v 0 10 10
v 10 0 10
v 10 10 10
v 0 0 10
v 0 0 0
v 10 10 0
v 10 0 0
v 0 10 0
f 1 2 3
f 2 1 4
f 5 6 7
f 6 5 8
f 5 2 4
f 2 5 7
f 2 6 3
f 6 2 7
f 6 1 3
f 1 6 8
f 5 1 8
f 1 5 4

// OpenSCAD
//  CUBO SIMPLE

//  un cubo simple en el origen de cordenadas con una
//  arista igual a 10 unidades

// Pdta( este es un comentario, no se ejecuta)

cube([10,10,10]);
